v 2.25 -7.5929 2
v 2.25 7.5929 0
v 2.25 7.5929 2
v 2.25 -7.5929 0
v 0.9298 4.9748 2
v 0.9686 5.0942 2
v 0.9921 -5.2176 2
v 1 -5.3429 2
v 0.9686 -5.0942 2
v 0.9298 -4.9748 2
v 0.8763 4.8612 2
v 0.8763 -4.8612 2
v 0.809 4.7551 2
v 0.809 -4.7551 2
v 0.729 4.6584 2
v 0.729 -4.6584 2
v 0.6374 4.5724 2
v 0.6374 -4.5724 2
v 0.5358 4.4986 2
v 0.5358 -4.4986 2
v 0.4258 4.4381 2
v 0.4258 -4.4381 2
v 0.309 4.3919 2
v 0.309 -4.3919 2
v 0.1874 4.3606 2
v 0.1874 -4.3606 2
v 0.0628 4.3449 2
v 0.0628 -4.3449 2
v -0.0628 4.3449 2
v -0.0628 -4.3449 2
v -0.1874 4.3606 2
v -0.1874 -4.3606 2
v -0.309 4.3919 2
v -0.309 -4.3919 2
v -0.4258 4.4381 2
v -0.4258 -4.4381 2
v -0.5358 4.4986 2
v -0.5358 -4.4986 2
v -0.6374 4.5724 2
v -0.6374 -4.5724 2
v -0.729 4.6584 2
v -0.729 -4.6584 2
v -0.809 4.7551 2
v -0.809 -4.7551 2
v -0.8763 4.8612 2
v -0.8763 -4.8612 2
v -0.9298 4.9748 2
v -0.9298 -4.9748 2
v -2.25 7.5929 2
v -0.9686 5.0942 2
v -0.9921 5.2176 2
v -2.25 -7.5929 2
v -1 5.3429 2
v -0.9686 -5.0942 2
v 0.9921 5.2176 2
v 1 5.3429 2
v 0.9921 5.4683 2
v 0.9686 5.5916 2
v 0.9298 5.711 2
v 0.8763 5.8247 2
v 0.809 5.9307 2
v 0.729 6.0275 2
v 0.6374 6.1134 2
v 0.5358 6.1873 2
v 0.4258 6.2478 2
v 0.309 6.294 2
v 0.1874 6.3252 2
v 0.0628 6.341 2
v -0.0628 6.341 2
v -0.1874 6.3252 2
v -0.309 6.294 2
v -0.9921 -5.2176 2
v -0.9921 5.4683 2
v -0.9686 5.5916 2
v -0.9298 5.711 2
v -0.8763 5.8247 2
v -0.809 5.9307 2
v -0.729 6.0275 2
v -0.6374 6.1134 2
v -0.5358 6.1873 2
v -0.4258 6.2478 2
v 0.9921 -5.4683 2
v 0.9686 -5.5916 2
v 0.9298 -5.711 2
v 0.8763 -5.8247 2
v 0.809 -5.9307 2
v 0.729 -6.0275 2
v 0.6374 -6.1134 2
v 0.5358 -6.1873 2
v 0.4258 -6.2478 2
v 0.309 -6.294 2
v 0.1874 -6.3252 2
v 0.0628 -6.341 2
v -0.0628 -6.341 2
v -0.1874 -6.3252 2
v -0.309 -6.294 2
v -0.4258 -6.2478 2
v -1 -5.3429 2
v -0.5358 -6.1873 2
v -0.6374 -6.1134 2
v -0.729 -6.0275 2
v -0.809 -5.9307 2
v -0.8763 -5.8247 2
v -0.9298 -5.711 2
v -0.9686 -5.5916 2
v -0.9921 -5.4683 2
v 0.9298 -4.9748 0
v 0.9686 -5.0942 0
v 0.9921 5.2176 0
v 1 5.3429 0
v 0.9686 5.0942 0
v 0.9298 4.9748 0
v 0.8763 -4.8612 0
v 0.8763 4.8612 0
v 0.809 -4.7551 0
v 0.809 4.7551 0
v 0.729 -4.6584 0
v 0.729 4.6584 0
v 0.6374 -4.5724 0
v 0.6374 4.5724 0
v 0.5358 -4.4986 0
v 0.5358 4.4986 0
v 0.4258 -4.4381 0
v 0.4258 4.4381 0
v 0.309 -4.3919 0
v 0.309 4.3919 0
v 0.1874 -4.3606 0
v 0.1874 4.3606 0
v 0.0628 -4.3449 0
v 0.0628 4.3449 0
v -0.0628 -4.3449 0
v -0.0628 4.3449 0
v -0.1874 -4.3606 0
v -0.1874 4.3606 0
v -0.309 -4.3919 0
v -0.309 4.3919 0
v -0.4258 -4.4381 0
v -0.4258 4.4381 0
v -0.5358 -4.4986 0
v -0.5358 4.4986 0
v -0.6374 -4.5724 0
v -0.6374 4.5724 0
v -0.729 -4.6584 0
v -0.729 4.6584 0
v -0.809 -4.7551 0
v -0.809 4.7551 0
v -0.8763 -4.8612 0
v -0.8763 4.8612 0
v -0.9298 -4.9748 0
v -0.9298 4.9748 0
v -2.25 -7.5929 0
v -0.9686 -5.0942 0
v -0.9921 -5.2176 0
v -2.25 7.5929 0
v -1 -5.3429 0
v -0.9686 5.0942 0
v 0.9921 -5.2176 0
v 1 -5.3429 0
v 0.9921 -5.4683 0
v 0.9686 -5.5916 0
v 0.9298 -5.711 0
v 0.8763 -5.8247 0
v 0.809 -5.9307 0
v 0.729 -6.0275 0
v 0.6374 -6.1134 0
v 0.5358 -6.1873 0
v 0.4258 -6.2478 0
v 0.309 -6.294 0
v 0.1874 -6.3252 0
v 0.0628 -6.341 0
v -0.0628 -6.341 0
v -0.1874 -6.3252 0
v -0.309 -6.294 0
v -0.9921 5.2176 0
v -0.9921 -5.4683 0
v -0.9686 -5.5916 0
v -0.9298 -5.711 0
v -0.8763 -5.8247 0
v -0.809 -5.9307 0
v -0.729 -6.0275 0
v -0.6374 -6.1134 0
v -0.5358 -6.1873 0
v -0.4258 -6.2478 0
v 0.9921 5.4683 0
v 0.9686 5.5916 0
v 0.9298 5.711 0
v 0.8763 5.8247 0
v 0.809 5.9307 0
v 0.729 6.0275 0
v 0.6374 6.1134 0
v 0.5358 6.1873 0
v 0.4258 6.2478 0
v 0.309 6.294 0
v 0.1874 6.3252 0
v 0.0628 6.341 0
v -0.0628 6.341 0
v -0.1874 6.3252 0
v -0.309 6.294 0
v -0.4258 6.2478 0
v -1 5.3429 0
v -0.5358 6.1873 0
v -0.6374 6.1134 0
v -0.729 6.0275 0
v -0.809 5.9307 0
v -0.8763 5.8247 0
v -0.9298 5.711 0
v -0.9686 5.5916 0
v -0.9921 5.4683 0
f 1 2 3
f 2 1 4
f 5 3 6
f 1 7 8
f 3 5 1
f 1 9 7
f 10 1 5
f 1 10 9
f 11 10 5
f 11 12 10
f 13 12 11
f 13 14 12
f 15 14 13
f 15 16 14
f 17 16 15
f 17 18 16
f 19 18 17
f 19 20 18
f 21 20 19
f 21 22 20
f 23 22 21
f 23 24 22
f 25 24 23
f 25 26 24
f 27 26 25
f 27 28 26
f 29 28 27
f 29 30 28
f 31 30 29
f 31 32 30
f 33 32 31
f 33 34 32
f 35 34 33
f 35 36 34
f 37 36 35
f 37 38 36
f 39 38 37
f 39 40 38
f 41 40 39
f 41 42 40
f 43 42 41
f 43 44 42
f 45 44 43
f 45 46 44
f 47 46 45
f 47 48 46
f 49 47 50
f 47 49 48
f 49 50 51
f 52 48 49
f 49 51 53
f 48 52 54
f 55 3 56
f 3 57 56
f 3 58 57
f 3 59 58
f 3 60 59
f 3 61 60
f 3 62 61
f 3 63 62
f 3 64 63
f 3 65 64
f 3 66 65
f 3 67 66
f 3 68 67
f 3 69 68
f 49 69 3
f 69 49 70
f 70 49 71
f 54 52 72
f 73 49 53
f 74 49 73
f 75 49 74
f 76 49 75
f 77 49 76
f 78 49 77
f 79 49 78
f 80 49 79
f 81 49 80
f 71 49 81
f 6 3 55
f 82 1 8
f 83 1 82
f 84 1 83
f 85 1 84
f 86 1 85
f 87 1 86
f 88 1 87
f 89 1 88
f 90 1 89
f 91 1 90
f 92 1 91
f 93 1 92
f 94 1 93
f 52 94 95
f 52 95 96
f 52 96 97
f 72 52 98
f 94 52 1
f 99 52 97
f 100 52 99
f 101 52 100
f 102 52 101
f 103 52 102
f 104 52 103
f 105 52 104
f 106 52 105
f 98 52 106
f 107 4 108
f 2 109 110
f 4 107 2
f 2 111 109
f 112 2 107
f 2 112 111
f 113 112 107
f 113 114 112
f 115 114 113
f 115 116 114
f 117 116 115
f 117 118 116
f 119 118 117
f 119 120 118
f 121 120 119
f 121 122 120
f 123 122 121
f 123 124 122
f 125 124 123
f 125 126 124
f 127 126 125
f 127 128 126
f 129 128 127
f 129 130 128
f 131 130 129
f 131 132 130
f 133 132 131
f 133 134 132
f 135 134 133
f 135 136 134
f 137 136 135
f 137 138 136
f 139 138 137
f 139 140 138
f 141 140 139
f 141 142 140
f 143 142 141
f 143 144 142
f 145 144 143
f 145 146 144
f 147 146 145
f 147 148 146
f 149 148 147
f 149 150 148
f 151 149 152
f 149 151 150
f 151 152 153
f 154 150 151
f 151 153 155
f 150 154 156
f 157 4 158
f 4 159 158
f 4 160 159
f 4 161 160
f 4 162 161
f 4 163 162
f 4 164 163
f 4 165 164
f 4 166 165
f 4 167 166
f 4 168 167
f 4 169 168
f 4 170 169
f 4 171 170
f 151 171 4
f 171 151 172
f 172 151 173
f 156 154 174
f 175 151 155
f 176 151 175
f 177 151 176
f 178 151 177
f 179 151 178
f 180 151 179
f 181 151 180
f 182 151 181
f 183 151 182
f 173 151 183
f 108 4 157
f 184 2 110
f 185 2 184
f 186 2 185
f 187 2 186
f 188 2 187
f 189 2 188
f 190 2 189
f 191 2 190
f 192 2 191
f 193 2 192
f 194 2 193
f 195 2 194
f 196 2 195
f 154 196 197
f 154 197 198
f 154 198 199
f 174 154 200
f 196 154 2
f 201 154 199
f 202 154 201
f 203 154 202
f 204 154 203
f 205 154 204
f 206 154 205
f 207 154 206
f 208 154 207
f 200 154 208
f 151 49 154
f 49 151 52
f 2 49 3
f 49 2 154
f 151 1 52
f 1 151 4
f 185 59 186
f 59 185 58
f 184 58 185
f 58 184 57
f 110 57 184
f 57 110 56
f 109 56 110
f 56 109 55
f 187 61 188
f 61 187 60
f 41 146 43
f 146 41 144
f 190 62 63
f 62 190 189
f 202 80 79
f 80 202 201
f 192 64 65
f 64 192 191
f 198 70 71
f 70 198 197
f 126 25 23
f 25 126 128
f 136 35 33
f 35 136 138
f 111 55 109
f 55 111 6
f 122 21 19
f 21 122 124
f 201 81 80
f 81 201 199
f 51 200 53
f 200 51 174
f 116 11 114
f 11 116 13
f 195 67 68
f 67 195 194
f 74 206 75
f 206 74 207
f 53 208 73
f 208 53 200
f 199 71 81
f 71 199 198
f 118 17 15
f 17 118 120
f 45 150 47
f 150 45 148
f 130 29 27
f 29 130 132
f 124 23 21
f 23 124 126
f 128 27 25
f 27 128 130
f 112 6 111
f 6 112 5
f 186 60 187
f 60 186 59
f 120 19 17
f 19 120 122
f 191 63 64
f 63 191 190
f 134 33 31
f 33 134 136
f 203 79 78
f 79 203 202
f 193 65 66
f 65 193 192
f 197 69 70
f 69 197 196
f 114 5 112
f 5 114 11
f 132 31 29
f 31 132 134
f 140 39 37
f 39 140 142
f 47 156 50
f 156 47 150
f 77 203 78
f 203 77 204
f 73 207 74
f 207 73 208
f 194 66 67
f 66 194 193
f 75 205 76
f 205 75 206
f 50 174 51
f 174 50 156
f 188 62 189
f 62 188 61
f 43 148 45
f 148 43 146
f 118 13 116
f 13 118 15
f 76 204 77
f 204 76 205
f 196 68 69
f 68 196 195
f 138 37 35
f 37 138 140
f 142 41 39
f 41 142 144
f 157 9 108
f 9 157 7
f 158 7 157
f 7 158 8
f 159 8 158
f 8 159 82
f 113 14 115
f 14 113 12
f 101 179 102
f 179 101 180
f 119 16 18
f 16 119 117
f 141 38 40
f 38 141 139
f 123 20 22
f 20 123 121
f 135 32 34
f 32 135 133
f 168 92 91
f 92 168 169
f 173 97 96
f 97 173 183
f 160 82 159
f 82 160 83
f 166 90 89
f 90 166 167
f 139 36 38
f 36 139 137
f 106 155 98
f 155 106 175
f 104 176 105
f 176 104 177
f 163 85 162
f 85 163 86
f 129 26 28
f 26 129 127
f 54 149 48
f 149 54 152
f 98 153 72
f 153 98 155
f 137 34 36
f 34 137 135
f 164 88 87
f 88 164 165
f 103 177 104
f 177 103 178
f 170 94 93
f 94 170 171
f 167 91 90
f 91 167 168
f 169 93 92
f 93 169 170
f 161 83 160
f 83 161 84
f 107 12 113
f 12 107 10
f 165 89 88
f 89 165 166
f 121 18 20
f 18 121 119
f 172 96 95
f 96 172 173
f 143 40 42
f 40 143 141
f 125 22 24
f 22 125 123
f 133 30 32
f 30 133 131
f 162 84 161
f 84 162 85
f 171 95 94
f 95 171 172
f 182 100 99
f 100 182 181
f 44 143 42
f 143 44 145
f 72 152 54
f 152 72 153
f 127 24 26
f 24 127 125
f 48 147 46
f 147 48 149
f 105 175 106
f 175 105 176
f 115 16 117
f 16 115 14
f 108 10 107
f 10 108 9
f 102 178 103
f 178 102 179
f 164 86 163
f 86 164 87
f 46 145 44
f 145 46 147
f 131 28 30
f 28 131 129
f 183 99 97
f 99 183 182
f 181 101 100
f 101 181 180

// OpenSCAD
// file: parameters-nylonshape.scad
//P
//Parameters for nylonrail
//P

// diameter of nylonrail
diameter = 2;
// length of nylonrail
length = 10;
// number of rails (5 corner star -> 5 rails)
number = 5;
// angle between two rails
angle = ((number-2)*180)/number;
//strength of screw rings
ring_strength = 2;
//strength of nylon rails
rail_strength = 1;


//M
//Screw Measurements
//M
//M2 screw, for better hold decrease slightly
screw_diameter = 2;
//smallest diameter of nut
nut = 4;
//largest diameter of nut
nut_l=4.5;

//P
//Parameters for screw ring placement
//P

//with center at the crossing of the two rails,
//this is the distance of the center of the screw ring:

//distance = tan(90-angle/2) * 2 * sin(90-angle/2) / (rail_strength*2+diameter);
betta = 90-angle/2;
total_diameter = 2*ring_strength + diameter;
distance = tan(betta)*( (total_diameter)/sin(betta)+ nut_l)/2;
// main file
include <parameters-nylonshape.scad>;

module screwholder(screw_diameter, nut, nut_l, ring_strength, rail_strength, diameter,distance)
{	
	difference()
	{


		translate([0,0,ring_strength/2])
		cube([nut_l, 2*distance + nut_l, ring_strength], center=true);

		translate([0,distance,0])	
		cylinder(h= ring_strength, r= screw_diameter/2, $fn=50);

		translate([0,- distance,0])	
		cylinder(h= ring_strength +2, r= screw_diameter/2, $fn=50);

	}
}


screwholder(screw_diameter, nut, nut_l, ring_strength, rail_strength, diameter,distance);
